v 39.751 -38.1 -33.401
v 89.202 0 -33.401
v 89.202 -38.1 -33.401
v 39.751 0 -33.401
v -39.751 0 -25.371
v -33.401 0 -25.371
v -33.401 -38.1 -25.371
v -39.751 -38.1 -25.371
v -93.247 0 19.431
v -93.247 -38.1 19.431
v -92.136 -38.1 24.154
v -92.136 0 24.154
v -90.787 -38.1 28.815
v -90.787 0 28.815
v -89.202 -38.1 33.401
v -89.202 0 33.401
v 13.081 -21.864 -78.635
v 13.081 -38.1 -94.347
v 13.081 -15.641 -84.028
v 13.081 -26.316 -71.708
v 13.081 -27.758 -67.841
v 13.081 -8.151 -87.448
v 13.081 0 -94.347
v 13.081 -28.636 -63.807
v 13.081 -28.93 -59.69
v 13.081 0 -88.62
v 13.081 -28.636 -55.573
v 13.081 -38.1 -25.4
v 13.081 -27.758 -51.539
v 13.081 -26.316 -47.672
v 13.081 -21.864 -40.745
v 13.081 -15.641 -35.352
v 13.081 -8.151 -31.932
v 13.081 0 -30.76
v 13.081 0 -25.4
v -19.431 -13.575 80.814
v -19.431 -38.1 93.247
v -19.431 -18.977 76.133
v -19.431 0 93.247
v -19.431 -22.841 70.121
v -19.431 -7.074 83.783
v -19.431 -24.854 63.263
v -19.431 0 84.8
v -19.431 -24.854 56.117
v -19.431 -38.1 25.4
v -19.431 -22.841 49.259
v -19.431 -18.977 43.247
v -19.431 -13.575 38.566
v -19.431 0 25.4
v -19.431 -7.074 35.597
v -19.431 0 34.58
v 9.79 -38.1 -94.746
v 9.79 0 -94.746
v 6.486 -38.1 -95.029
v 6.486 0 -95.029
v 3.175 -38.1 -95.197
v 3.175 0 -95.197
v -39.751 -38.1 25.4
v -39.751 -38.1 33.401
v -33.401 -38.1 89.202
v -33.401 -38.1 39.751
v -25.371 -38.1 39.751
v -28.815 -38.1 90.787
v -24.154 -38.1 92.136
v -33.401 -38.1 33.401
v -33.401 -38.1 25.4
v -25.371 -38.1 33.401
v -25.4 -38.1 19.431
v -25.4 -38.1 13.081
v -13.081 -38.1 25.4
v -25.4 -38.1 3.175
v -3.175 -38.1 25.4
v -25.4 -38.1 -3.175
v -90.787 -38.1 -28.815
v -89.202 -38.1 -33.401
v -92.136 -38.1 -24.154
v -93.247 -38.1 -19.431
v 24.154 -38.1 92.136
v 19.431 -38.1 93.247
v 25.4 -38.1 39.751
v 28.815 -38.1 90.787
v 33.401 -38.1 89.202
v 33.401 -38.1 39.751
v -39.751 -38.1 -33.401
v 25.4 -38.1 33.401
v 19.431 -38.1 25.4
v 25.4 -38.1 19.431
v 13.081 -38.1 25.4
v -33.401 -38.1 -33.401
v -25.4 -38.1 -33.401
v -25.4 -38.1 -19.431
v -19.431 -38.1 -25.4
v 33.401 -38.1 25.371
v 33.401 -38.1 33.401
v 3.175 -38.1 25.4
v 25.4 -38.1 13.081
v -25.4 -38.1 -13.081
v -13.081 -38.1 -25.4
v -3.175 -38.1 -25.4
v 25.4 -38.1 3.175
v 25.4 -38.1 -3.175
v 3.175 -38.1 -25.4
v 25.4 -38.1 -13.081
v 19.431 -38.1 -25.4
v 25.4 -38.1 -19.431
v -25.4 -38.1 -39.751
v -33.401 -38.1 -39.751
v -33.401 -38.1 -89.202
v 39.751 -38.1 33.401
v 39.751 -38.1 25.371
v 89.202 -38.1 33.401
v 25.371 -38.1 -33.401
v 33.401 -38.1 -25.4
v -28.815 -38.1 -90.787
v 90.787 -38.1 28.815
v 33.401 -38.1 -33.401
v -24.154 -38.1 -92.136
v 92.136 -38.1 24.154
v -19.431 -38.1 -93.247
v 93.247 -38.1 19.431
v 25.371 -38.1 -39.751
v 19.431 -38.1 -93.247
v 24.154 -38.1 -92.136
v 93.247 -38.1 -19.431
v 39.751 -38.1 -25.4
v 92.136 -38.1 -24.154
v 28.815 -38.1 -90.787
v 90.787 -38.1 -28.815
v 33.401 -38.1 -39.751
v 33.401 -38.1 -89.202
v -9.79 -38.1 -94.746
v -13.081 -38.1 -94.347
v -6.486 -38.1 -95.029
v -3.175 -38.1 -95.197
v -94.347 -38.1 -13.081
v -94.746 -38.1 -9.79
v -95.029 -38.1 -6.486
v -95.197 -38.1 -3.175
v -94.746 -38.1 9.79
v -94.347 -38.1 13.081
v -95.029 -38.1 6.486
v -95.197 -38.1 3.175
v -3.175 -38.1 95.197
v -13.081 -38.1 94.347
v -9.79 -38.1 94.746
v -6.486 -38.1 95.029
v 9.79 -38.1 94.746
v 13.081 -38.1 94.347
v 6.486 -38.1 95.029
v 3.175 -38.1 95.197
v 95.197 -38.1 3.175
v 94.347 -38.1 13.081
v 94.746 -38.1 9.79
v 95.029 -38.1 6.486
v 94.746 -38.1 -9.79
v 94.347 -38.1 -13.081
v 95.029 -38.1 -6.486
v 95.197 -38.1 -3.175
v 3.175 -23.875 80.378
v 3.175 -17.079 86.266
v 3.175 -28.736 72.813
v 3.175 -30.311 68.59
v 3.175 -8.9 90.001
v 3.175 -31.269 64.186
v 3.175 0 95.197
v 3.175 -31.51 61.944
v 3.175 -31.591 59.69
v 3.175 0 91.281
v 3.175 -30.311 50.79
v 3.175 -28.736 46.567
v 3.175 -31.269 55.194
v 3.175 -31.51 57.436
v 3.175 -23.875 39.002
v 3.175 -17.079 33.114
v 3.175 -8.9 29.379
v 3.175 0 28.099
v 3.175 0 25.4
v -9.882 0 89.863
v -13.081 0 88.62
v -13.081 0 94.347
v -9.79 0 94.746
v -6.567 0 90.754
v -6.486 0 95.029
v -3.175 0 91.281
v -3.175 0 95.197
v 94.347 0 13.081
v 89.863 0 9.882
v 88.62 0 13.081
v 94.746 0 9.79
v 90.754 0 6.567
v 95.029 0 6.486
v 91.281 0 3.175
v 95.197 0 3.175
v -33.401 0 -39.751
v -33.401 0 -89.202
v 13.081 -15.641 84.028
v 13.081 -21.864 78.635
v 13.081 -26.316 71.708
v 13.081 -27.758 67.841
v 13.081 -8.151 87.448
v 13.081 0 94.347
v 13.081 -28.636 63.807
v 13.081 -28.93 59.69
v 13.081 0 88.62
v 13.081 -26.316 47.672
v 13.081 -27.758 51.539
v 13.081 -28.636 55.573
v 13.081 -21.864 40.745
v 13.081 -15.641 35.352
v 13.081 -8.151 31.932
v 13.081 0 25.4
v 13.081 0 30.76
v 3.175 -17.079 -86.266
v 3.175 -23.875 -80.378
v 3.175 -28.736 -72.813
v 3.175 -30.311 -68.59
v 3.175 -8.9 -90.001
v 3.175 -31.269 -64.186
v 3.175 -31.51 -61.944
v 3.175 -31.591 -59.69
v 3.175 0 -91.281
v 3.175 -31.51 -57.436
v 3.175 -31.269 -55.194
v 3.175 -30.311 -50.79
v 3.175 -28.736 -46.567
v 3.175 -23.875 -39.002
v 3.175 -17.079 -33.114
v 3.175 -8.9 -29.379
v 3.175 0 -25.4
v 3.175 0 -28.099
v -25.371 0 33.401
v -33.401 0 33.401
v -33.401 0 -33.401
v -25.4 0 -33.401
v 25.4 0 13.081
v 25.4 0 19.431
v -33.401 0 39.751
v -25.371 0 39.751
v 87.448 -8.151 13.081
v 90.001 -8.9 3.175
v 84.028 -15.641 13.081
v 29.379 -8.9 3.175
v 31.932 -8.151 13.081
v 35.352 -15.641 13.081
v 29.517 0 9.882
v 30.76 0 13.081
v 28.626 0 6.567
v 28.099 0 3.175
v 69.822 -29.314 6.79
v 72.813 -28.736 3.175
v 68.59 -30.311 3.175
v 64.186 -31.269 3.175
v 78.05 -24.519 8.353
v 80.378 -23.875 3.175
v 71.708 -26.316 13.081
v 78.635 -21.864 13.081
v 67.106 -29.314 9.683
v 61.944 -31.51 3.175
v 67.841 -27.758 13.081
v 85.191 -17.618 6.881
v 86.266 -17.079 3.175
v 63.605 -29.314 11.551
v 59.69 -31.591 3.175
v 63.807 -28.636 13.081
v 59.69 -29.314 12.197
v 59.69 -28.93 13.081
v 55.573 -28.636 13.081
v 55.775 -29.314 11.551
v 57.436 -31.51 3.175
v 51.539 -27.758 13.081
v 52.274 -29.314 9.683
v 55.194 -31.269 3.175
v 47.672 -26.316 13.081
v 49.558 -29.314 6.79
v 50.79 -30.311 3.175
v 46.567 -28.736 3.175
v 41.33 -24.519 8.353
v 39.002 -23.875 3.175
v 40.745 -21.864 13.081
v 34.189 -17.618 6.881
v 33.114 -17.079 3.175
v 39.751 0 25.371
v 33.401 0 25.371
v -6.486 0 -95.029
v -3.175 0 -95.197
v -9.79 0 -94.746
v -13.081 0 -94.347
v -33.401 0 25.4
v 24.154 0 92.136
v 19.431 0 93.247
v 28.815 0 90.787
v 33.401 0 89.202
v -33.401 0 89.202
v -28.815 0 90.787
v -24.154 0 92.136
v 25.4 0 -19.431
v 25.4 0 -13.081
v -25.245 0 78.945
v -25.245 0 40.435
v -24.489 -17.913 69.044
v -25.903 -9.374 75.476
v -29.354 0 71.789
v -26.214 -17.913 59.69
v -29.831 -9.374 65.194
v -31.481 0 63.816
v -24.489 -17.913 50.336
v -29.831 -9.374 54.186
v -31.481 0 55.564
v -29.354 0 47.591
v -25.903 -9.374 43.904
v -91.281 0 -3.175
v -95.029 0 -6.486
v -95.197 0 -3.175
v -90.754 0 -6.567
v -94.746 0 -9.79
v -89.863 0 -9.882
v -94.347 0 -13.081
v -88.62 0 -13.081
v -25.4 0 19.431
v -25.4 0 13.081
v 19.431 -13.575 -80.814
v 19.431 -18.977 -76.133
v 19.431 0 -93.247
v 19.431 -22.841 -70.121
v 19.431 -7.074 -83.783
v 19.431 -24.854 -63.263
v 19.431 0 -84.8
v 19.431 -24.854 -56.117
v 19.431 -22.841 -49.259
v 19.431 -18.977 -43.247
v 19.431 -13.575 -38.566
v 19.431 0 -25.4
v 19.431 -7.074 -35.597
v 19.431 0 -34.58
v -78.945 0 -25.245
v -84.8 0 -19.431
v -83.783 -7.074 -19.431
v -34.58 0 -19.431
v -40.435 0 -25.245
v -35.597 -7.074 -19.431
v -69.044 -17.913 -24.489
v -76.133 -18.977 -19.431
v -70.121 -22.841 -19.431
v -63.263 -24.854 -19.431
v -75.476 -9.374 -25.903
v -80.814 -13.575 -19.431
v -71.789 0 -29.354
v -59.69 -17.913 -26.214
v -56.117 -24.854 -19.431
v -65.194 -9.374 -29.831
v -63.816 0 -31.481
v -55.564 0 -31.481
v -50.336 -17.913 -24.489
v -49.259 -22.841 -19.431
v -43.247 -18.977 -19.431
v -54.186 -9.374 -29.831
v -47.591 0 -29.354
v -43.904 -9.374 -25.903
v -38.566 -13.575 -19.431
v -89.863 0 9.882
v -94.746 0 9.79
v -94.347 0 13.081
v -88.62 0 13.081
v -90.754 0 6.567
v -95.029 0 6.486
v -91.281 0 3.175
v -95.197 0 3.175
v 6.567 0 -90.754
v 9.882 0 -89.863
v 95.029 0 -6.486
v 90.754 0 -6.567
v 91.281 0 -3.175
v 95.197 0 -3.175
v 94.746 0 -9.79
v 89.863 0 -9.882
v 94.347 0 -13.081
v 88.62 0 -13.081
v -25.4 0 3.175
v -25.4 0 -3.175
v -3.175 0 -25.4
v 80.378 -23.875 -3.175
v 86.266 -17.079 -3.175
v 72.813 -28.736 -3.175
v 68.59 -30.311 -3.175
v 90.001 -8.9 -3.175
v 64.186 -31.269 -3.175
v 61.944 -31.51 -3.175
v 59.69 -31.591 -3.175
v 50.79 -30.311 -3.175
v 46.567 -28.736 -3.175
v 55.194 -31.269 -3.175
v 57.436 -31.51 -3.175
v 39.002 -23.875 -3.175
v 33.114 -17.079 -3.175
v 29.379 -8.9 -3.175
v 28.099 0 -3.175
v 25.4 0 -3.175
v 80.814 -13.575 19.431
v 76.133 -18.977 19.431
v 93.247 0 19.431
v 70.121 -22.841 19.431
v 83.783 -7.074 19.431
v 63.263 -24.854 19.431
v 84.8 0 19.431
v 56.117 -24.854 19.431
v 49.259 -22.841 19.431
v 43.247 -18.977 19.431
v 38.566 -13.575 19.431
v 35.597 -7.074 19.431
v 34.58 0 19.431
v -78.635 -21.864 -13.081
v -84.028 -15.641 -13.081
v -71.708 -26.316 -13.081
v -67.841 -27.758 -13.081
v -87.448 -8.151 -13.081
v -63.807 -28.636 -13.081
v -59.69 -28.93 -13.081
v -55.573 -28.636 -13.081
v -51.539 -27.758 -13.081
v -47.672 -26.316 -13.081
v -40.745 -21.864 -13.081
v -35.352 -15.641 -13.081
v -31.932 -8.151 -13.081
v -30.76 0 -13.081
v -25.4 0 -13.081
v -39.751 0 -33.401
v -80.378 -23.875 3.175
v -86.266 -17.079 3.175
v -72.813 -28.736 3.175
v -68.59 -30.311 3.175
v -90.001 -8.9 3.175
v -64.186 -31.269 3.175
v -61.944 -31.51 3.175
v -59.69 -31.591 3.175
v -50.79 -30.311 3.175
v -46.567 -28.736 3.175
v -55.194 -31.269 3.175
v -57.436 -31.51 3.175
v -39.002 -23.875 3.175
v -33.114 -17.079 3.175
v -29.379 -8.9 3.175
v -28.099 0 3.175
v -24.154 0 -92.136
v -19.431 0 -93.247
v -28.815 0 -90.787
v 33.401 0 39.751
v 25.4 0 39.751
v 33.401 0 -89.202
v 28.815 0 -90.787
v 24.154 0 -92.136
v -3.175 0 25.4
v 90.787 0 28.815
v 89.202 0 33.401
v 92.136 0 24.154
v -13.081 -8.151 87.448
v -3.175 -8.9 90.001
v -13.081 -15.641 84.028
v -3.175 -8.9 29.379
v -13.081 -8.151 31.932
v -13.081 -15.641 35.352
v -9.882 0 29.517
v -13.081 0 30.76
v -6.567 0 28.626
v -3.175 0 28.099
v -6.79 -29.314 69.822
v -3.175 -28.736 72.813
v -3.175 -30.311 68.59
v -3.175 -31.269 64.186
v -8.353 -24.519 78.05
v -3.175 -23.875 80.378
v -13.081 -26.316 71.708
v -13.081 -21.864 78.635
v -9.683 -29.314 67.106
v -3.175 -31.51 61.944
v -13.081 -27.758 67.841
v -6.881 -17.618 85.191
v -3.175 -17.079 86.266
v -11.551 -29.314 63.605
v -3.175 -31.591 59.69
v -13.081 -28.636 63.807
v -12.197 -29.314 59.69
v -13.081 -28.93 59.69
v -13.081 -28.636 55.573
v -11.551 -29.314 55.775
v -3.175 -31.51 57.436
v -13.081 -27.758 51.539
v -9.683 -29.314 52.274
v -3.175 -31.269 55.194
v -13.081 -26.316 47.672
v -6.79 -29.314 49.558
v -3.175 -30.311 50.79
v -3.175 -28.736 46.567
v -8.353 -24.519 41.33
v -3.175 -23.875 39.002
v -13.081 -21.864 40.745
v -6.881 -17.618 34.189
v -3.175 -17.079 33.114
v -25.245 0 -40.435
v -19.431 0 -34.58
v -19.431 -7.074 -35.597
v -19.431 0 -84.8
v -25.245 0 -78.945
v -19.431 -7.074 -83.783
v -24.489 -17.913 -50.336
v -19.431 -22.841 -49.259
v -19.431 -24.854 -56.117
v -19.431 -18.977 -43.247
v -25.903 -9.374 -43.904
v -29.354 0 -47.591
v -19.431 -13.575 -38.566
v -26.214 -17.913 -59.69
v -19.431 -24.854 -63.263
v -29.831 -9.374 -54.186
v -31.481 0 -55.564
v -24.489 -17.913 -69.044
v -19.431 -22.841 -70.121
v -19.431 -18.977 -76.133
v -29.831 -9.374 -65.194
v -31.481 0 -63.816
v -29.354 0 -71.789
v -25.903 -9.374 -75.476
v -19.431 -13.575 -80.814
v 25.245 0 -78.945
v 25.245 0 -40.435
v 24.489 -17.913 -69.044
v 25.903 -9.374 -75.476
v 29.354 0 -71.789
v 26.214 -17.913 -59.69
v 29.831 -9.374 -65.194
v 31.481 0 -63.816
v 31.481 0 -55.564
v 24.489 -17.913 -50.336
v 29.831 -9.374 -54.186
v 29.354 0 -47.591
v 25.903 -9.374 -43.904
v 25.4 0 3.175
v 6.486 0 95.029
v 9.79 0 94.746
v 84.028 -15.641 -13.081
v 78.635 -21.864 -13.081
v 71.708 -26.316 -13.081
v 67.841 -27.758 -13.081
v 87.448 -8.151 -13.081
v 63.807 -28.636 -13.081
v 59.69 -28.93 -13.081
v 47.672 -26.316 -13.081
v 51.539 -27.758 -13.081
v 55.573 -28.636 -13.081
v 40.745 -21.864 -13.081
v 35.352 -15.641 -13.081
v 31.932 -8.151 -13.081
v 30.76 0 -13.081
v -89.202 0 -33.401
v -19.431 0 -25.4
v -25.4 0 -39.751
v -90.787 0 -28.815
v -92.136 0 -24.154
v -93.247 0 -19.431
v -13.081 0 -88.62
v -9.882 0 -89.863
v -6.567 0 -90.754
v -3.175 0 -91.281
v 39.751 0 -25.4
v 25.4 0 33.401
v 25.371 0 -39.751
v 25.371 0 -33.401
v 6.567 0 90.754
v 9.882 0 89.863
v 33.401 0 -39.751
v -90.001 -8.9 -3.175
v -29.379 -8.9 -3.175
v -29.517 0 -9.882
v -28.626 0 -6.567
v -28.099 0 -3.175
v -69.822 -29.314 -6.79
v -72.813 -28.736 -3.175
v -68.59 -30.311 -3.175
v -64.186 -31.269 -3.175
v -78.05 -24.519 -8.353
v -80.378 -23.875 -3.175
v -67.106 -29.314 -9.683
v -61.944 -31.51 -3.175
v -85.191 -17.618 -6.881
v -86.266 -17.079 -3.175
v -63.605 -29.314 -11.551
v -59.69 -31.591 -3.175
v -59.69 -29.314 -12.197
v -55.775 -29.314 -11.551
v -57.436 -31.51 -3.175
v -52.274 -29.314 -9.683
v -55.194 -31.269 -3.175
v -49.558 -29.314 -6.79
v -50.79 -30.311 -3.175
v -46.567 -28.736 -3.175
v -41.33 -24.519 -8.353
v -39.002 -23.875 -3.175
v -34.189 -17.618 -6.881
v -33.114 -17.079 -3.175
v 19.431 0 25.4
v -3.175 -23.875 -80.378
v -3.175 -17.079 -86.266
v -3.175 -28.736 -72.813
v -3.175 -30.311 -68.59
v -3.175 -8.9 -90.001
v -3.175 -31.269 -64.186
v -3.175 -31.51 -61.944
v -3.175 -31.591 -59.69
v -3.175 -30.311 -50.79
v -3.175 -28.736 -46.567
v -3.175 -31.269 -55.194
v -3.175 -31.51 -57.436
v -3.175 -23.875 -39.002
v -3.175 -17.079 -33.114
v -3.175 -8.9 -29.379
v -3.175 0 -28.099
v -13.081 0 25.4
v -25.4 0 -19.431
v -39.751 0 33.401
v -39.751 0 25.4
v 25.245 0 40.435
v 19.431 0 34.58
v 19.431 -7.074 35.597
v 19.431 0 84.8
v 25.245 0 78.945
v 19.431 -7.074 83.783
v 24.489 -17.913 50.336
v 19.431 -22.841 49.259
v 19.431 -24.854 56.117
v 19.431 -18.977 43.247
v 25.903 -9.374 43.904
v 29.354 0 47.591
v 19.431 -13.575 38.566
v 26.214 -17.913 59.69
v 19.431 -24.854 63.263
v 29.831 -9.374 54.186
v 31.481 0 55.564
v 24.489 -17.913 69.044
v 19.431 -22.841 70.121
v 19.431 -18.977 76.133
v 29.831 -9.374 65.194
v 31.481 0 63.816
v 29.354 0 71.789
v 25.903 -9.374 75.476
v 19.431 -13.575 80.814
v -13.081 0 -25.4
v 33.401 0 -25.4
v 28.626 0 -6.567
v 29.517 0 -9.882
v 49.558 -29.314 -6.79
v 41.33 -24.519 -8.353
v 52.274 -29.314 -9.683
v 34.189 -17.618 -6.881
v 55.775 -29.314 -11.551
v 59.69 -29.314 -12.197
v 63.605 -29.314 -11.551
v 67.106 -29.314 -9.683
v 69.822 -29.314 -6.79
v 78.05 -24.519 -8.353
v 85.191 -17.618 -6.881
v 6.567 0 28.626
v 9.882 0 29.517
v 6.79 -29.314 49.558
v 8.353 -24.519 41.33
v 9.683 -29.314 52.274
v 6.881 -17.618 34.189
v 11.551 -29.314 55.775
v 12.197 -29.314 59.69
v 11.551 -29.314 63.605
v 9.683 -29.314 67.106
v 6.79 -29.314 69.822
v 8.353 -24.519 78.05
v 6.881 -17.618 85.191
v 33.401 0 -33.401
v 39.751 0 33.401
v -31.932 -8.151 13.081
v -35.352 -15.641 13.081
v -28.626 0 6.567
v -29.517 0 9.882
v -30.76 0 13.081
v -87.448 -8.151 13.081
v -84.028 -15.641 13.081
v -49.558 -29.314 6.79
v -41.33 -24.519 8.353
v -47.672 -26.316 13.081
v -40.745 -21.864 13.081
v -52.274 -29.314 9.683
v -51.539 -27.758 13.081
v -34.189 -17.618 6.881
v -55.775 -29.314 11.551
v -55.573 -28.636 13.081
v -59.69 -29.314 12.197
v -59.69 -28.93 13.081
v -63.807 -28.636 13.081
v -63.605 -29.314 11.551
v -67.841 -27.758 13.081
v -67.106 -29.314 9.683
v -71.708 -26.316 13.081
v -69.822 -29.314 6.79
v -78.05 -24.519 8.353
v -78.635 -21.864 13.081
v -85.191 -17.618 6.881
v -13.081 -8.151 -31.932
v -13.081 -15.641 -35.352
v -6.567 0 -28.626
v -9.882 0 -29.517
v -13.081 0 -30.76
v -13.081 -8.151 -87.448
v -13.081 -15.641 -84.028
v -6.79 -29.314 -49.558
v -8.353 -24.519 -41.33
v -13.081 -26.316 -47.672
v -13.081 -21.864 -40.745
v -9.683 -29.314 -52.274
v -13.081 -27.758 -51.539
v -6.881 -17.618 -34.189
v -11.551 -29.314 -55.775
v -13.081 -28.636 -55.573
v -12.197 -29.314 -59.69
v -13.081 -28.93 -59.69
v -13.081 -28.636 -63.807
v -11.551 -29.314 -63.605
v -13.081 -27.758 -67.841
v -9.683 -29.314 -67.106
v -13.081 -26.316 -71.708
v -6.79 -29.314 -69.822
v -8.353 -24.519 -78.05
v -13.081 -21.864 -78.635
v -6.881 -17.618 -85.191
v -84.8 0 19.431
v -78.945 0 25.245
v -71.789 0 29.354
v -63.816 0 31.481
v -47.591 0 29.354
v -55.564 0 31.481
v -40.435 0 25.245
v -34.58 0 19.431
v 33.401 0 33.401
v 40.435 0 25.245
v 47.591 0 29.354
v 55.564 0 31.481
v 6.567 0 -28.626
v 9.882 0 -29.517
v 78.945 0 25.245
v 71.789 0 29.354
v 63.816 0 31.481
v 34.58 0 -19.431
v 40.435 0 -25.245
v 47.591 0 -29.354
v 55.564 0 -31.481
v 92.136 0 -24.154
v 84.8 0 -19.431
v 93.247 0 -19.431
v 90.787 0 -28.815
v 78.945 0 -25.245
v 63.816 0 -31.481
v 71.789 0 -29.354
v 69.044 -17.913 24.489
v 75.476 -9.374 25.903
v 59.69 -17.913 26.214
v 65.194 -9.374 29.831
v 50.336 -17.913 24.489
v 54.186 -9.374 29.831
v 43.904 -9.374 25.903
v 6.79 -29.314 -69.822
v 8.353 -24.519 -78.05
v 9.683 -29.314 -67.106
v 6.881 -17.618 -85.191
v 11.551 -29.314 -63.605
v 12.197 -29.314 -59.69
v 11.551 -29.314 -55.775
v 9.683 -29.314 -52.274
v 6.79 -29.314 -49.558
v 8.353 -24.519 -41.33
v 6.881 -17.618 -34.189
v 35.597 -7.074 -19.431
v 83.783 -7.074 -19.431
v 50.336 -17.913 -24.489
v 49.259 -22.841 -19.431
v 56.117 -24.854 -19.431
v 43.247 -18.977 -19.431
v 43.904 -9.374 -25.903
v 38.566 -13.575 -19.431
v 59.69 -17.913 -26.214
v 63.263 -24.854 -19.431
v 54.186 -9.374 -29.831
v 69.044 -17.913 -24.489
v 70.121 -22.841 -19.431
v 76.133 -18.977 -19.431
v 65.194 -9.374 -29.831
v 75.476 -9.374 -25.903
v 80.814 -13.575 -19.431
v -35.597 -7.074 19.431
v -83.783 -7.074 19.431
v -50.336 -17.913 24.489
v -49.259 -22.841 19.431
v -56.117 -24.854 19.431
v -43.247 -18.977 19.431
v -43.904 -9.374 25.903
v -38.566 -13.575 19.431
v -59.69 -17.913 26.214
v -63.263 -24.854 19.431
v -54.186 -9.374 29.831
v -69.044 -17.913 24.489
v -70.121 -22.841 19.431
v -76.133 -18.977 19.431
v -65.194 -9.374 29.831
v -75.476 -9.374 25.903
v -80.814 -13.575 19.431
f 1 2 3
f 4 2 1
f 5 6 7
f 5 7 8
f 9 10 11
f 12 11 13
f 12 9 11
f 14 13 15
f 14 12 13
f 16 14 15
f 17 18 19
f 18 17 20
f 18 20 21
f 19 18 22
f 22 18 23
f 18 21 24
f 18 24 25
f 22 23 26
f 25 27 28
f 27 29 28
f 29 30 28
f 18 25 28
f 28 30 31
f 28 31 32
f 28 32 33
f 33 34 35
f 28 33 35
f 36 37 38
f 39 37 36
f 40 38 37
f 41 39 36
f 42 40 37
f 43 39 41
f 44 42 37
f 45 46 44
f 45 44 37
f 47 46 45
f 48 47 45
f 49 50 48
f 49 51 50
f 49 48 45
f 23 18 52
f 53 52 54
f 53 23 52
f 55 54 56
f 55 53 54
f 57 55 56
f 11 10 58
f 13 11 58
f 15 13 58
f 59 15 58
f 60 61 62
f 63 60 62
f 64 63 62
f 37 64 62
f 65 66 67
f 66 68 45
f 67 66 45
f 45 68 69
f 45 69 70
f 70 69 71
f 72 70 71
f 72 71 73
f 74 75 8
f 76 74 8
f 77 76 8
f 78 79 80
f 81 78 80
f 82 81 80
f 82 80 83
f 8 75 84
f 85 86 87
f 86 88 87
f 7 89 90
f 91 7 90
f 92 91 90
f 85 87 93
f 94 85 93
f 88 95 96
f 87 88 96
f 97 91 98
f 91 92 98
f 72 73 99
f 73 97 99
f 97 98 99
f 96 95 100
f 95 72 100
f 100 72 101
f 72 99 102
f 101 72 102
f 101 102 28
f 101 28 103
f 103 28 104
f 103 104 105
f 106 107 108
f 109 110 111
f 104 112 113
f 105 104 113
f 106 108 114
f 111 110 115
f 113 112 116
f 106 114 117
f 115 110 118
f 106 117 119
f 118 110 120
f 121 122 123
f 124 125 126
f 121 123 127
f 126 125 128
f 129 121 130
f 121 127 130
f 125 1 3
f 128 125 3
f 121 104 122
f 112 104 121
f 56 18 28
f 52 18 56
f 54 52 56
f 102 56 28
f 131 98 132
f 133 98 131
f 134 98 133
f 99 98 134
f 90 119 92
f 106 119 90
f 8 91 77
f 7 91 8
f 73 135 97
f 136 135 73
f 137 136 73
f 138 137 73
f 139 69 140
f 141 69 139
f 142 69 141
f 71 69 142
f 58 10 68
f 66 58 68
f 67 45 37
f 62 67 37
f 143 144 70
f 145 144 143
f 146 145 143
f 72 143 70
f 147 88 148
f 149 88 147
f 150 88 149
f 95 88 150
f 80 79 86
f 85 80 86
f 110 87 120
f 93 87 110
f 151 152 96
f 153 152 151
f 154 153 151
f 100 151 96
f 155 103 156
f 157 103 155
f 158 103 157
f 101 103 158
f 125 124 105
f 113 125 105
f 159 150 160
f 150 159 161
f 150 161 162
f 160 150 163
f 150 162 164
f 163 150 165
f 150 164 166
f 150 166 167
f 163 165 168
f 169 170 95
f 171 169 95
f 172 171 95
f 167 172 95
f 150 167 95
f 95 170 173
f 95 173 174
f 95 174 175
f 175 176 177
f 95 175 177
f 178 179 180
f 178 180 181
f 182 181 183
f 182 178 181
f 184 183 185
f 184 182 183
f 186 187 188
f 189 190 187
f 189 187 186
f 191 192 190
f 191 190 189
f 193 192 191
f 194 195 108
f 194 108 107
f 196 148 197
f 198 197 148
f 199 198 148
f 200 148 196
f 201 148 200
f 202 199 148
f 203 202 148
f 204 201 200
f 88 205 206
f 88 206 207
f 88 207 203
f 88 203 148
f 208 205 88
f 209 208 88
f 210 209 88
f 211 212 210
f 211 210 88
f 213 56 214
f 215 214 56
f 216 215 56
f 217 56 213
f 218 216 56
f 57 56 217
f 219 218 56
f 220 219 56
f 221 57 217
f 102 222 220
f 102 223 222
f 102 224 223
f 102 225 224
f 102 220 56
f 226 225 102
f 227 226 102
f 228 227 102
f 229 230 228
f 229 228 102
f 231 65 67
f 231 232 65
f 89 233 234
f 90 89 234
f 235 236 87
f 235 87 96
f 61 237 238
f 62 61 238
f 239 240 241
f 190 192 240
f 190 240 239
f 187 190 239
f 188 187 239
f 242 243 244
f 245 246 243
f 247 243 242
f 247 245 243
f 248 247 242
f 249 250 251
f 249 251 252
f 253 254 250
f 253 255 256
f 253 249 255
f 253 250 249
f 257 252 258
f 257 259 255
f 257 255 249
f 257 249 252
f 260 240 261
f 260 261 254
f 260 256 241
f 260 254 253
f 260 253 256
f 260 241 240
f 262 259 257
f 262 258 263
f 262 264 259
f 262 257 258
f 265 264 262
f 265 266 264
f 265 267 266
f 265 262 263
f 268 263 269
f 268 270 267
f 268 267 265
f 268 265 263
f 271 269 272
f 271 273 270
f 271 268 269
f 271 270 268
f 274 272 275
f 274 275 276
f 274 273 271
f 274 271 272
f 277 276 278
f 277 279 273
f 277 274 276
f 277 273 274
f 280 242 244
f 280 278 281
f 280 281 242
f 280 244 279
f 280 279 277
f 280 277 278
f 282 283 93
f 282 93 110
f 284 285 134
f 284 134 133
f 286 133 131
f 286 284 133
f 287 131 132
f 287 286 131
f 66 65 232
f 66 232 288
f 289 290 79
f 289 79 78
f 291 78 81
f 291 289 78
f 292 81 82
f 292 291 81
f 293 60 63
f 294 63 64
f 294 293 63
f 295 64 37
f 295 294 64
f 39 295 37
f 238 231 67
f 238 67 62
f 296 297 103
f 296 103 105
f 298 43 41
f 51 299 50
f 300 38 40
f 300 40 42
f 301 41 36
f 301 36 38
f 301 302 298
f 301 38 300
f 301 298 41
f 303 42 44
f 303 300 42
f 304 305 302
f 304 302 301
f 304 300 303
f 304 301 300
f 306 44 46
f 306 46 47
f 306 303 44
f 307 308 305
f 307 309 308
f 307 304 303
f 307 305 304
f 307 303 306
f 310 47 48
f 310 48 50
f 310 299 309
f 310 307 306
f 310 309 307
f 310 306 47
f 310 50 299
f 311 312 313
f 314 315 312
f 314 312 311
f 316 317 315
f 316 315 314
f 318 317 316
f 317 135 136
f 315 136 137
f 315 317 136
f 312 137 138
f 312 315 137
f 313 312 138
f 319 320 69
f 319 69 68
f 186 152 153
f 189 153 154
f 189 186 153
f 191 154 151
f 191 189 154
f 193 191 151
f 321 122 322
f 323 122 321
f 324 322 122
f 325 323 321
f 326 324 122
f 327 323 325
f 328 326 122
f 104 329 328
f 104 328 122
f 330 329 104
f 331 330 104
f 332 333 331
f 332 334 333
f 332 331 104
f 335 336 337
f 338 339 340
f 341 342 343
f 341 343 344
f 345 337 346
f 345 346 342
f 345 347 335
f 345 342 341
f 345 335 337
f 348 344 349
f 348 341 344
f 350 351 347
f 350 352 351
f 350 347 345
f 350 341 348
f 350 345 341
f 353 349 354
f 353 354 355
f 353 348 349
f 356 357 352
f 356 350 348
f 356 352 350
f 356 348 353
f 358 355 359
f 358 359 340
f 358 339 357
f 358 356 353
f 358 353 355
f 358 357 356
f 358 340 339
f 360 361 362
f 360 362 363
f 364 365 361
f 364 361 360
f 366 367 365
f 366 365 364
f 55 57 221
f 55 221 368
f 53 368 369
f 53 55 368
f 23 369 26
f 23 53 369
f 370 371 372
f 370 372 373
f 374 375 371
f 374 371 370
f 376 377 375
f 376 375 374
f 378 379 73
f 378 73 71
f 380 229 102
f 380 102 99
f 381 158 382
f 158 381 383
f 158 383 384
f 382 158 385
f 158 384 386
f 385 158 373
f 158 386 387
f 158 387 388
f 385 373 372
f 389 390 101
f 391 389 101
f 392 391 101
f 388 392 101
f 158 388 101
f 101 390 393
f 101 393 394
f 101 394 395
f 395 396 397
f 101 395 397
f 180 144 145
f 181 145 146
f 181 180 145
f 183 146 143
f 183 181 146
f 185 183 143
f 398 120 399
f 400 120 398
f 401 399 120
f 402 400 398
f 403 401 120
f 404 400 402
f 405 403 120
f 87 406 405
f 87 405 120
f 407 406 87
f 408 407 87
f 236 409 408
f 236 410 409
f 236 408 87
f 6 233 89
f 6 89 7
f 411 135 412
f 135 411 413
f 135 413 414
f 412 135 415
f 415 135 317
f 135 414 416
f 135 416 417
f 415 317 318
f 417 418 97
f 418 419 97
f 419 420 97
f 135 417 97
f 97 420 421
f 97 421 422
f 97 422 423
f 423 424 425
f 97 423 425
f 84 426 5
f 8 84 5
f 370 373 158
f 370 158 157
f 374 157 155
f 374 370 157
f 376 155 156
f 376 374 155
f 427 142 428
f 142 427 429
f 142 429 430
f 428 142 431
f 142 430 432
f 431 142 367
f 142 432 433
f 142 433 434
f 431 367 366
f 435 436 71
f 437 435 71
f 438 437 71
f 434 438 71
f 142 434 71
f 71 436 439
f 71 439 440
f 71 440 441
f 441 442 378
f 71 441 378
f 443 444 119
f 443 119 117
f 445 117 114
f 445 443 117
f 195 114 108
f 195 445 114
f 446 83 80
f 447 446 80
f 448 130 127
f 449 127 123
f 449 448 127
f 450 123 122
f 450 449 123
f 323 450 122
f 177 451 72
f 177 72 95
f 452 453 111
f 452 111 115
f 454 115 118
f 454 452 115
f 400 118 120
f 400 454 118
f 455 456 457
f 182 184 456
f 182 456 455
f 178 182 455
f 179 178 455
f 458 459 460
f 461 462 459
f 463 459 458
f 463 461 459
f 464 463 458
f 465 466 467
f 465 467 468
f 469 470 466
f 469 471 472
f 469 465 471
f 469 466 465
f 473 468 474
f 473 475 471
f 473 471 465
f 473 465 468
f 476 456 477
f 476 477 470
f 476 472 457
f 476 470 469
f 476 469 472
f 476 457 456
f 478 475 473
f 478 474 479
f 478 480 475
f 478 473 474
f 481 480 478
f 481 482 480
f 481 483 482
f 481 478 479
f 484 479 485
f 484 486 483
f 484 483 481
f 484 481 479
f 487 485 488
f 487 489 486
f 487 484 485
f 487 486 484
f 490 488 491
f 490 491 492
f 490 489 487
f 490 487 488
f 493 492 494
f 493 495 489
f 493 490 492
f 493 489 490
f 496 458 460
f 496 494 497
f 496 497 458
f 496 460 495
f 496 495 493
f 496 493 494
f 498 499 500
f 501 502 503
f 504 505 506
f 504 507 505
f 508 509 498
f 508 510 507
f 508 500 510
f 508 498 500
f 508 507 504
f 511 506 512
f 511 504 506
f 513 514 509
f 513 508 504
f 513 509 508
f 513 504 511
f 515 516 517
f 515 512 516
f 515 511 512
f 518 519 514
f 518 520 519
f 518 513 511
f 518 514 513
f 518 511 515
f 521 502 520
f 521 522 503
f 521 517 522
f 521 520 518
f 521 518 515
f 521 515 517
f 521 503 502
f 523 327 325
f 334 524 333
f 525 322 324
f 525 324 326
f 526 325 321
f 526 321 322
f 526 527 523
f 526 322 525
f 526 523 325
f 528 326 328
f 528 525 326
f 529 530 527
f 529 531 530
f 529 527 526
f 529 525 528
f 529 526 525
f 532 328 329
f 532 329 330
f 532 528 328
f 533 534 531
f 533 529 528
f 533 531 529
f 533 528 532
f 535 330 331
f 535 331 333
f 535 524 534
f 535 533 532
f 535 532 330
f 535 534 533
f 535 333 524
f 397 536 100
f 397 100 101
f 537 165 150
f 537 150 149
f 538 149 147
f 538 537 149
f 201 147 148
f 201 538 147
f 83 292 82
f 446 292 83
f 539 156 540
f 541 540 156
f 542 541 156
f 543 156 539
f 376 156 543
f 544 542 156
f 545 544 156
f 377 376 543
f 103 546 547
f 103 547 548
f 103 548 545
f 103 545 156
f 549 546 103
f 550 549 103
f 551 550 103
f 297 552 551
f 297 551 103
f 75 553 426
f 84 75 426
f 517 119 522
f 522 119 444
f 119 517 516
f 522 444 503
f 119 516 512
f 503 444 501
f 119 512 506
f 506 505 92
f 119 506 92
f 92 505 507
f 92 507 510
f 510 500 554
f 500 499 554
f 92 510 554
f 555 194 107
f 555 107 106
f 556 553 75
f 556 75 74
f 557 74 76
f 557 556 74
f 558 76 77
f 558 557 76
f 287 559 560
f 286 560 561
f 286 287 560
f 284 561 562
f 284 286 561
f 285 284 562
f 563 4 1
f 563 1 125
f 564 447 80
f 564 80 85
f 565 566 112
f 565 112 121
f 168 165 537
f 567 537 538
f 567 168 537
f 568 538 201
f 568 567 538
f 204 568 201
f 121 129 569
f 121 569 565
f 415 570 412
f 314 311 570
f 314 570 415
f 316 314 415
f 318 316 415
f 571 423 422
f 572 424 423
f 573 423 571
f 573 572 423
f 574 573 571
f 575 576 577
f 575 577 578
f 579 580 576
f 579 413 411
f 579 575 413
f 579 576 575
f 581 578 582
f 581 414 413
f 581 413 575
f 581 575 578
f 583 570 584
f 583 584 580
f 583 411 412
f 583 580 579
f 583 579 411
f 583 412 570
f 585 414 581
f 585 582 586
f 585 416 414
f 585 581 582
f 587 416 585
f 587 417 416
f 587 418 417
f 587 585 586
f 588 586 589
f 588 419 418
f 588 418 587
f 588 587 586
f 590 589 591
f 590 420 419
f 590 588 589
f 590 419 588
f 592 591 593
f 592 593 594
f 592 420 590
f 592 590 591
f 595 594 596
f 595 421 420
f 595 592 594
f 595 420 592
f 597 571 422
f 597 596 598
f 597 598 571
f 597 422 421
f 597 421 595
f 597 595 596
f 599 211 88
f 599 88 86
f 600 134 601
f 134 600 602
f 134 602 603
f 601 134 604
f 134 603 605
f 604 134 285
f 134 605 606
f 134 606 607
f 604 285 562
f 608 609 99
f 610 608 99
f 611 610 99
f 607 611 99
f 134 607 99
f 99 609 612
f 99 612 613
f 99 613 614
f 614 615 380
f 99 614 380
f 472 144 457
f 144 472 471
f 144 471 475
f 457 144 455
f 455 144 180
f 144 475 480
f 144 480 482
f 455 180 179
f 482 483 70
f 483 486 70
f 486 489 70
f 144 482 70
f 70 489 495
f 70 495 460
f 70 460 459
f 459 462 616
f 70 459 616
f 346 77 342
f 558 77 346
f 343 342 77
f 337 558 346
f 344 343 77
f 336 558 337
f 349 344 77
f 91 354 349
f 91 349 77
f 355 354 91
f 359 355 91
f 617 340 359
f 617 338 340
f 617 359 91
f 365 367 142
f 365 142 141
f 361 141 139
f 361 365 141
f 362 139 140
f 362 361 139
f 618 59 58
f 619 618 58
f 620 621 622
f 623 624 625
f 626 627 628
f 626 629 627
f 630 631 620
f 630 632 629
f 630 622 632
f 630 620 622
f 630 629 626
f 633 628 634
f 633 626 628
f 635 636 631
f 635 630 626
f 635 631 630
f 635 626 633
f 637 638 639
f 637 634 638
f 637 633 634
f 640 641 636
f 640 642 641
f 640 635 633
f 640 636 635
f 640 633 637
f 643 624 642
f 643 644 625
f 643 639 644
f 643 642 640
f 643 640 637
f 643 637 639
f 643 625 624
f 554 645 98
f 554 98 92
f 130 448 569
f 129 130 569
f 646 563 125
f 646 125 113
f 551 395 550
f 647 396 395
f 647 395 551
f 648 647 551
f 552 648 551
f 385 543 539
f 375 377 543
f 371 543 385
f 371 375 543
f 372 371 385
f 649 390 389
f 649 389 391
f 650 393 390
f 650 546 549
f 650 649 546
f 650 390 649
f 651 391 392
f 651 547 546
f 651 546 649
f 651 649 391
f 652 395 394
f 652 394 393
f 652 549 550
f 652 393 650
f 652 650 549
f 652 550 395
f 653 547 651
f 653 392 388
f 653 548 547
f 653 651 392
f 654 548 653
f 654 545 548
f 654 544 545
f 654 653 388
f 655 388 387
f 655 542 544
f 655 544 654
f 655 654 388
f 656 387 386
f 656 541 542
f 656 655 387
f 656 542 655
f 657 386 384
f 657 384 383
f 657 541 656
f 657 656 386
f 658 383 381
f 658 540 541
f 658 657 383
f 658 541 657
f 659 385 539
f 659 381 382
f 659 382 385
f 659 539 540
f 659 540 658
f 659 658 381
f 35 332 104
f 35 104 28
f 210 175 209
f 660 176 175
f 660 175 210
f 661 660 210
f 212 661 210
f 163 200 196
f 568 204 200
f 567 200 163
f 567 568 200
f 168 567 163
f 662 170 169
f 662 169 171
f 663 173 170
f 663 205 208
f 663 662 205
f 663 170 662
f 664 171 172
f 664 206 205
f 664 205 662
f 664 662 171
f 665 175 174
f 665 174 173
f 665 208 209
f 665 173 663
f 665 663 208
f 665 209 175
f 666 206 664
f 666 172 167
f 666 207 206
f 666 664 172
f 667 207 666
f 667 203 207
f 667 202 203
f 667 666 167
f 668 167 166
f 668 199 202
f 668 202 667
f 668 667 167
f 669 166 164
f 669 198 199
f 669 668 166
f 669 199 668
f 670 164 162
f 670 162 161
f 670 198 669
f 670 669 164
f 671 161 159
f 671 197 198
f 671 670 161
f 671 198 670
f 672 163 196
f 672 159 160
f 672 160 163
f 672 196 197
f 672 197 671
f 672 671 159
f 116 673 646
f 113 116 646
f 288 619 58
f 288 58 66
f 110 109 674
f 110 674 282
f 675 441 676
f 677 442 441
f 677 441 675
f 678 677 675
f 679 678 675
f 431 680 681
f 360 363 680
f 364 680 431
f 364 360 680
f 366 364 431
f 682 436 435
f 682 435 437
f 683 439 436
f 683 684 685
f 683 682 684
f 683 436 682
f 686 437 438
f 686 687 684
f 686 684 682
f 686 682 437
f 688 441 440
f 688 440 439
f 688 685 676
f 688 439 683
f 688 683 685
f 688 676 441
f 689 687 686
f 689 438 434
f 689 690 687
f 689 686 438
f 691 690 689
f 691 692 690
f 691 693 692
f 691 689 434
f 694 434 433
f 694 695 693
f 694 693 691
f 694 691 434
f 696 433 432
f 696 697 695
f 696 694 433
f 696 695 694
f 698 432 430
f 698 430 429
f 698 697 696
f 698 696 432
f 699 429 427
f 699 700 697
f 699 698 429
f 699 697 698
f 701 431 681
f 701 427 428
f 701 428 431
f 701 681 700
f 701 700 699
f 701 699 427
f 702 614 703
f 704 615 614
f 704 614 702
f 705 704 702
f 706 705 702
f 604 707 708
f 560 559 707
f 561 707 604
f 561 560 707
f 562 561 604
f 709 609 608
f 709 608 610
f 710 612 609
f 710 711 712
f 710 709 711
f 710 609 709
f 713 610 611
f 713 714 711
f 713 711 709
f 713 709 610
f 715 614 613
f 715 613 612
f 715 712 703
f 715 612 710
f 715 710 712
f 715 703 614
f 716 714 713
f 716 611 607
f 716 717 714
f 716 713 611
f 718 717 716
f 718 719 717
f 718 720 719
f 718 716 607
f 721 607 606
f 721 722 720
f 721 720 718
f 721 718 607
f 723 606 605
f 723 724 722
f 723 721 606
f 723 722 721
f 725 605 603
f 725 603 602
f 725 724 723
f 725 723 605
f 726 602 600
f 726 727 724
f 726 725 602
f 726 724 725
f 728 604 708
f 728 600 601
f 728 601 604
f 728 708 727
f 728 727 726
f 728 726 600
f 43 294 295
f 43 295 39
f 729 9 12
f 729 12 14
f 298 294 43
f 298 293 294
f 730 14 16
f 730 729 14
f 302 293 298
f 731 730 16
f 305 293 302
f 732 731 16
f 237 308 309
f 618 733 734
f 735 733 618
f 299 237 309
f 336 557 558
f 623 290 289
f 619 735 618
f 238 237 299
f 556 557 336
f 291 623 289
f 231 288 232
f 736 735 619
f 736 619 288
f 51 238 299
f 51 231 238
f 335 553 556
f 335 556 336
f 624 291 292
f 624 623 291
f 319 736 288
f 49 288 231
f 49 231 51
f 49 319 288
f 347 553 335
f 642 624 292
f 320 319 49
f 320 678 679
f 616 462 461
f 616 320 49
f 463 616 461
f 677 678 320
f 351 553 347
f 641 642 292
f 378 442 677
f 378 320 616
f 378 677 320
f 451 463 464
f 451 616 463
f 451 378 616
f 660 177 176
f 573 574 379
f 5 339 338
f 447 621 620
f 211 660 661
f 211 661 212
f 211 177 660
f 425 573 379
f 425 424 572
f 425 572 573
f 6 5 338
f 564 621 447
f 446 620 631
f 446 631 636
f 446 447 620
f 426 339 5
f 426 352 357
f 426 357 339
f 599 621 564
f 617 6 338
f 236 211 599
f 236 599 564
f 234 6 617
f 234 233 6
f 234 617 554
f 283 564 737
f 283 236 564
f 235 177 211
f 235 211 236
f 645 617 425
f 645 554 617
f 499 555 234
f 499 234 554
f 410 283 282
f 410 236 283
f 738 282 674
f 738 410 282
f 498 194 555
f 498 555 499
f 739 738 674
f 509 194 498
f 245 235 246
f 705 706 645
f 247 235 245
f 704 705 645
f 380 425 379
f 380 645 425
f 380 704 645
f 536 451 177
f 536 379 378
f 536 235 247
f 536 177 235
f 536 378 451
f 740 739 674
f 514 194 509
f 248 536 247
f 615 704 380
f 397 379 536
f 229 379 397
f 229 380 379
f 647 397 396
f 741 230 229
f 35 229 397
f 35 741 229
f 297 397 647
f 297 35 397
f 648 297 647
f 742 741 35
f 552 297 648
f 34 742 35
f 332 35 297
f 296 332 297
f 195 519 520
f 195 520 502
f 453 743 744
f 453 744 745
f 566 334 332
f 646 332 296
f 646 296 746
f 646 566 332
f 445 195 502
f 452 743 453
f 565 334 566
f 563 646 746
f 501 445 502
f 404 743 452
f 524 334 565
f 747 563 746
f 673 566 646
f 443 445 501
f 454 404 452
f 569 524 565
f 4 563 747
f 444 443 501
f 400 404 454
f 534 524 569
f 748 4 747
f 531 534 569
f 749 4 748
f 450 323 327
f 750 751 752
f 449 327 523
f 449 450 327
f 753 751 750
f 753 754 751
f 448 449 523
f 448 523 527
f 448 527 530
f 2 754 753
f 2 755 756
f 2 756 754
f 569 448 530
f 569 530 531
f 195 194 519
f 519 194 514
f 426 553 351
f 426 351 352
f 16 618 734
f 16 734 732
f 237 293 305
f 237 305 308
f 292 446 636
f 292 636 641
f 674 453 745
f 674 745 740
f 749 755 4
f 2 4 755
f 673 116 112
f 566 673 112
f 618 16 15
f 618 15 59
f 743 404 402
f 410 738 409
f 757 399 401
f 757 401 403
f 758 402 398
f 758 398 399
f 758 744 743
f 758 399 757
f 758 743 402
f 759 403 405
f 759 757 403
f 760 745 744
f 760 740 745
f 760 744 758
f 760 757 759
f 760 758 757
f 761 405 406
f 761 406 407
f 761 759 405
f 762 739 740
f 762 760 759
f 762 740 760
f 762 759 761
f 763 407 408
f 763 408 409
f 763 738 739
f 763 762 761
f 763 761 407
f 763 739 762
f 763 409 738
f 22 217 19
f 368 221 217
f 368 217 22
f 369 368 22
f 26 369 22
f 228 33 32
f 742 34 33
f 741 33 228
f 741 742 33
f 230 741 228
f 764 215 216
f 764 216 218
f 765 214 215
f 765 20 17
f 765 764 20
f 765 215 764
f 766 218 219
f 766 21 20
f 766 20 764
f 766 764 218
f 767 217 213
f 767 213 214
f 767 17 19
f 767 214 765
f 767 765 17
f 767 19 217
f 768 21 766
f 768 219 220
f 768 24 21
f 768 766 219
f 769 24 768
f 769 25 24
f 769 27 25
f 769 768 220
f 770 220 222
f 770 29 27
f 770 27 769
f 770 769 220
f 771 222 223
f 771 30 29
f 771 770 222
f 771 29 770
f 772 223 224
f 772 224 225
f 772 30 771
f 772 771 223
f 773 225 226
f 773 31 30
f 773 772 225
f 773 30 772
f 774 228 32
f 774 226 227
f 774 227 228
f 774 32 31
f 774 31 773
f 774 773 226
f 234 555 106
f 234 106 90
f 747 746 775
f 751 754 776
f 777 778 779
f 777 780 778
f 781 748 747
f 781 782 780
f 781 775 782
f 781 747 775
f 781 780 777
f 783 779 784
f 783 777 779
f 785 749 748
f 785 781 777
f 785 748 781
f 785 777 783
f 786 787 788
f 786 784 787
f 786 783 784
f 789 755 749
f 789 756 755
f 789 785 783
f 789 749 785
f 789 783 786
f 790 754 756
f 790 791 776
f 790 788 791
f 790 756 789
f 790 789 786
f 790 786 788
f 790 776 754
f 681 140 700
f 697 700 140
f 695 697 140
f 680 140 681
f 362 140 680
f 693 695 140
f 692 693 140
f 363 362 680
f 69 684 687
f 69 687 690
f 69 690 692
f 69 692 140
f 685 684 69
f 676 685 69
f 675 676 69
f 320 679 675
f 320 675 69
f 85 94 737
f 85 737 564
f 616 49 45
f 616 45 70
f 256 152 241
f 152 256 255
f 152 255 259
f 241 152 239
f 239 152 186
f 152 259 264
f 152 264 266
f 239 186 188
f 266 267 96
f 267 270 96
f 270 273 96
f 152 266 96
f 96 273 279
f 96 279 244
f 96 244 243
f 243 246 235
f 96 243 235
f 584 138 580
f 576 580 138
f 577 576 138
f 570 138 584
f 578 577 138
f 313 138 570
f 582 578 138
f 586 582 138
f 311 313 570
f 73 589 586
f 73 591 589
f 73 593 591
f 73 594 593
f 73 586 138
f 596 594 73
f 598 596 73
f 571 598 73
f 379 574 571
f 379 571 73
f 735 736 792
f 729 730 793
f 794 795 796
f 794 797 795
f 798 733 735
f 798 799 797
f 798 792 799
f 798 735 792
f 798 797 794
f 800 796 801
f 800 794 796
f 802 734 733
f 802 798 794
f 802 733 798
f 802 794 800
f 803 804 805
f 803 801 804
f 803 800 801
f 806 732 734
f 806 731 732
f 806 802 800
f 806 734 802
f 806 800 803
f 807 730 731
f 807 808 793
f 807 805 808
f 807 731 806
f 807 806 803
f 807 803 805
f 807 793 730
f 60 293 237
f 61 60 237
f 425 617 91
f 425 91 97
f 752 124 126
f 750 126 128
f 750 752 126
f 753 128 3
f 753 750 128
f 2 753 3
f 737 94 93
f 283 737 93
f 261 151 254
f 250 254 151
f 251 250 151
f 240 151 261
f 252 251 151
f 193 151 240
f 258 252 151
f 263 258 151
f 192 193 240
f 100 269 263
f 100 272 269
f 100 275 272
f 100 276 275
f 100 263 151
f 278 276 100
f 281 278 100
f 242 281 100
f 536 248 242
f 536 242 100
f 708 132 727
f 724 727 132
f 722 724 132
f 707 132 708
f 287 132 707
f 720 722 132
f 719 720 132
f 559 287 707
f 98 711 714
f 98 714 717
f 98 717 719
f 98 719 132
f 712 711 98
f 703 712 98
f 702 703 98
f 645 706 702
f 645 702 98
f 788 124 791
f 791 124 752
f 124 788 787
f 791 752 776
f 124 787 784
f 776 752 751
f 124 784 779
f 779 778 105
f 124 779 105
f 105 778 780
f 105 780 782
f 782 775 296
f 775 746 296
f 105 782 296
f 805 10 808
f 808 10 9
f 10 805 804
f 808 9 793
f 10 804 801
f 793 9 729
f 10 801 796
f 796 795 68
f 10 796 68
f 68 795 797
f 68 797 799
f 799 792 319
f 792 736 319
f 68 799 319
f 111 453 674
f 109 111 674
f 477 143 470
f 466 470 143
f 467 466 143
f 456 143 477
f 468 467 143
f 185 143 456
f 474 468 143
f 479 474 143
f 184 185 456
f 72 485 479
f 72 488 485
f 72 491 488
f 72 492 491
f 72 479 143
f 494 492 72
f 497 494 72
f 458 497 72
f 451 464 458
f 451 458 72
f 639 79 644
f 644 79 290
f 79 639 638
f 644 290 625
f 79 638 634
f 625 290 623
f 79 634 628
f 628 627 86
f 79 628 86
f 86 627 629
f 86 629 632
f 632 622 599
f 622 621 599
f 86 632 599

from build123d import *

# Parameters (mm, degrees)
BOSS_EXTRUDE1_DEPTH = 38.1
SKETCH7_W           = 6.35
SKETCH7_H           = 101.6
SKETCH7_H_2         = 100.875432805
CUT_EXTRUDE1_DEPTH  = 140.9883388
CIRPATTERN1_COUNT   = 4


with BuildPart() as part:
    # Sketch1 → Boss-Extrude1 (new body)
    with BuildSketch(Plane(origin=(0, 0, 0), x_dir=(1, 0, 0), z_dir=(0, 1, 0))):
        with BuildLine():
            Line((-33.444507811, 89.185354163), (-33.444507811, 33.696150168))
            Line((-33.444507811, 33.696150168), (-89.090582913, 33.696150168))
            ThreePointArc((-89.090582913, 33.696150168), (-95.25, 0), (-89.090582913, -33.696150168))
            Line((-89.090582913, -33.696150168), (-33.444507811, -33.696150168))
            Line((-33.444507811, -33.696150168), (-33.444507811, -89.185354163))
            ThreePointArc((-33.444507811, -89.185354163), (0, -95.25), (33.444507811, -89.185354163))
            Line((33.444507811, -89.185354163), (33.444507811, -33.696150168))
            Line((33.444507811, -33.696150168), (89.090582913, -33.696150168))
            ThreePointArc((89.090582913, -33.696150168), (95.25, 0), (89.090582913, 33.696150168))
            Line((89.090582913, 33.696150168), (33.444507811, 33.696150168))
            Line((33.444507811, 33.696150168), (33.444507811, 89.185354163))
            ThreePointArc((33.444507811, 89.185354163), (0, 95.25), (-33.444507811, 89.185354163))
        make_face()
    extrude(amount=-BOSS_EXTRUDE1_DEPTH)

    # Sketch3 → Cut-Revolve3 (revolve, cut)
    with BuildSketch(Plane.XY.offset(59.69)):
        with BuildLine():
            Line((0, 0), (0, -31.75))
            ThreePointArc((0, -31.75), (22.450640303, -22.450640303), (31.75, 0))
            Line((31.75, 0), (0, 0))
        make_face()
    cut_revolve3 = revolve(axis=Axis((0, 0, 59.69), (0, -1, 0)), mode=Mode.SUBTRACT)

    # Sketch7 → Cut-Extrude1 (cut, through all)
    with BuildSketch(Plane(origin=(0, 0, 0), x_dir=(1, 0, 0), z_dir=(0, 1, 0))):
        with Locations((-16.256, -76.2)):
            Rectangle(SKETCH7_W, SKETCH7_H)
        with Locations((0, -76.2)):
            Rectangle(SKETCH7_W, SKETCH7_H)
        with Locations((16.256, -75.837716403)):
            Rectangle(SKETCH7_W, SKETCH7_H_2)
        with Locations((36.576, -76.171178844)):
            Rectangle(SKETCH7_W, SKETCH7_H)
        with Locations((-36.576, -76.2)):
            Rectangle(SKETCH7_W, SKETCH7_H)
    cut_extrude1 = extrude(amount=-CUT_EXTRUDE1_DEPTH, mode=Mode.SUBTRACT)

    # CirPattern1: Cut-Revolve3, Cut-Extrude1 ×4 about axis
    cirpattern1_axis = Axis((0, 0, 0), (0, 1, 0))
    add([cut_revolve3.rotate(cirpattern1_axis, i * 360 / CIRPATTERN1_COUNT) for i in range(1, CIRPATTERN1_COUNT)], mode=Mode.SUBTRACT)
    add([cut_extrude1.rotate(cirpattern1_axis, i * 360 / CIRPATTERN1_COUNT) for i in range(1, CIRPATTERN1_COUNT)], mode=Mode.SUBTRACT)


solid = part.part
